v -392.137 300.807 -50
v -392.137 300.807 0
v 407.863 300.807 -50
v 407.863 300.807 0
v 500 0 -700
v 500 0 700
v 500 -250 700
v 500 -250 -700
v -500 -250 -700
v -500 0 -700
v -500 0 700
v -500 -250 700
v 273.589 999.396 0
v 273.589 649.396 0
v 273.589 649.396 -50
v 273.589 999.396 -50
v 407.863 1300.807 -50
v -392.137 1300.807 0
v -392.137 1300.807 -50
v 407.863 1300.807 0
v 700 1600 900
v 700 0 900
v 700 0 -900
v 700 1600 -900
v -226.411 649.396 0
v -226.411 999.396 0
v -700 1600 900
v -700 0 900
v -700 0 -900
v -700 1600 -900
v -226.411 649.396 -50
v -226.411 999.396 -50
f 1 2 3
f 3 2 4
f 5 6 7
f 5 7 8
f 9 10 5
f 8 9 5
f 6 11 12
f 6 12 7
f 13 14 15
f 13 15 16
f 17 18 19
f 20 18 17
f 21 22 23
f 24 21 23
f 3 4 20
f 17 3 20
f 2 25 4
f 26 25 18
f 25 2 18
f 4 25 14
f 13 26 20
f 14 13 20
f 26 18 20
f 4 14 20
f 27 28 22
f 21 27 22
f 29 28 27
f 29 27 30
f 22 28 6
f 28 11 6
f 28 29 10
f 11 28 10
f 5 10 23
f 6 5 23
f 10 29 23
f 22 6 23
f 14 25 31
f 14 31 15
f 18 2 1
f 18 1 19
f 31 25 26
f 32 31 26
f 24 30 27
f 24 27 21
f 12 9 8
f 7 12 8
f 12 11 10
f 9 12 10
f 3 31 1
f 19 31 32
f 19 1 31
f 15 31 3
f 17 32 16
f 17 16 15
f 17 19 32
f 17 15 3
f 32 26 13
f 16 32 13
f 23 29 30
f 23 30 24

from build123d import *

# Parameters (mm, degrees)
SKETCH1_W           = 1400
SKETCH1_H           = 1800
BOSS_EXTRUDE1_DEPTH = 1600
SKETCH2_W           = 1000
SKETCH2_H           = 1400
BOSS_EXTRUDE2_DEPTH = 250
SKETCH3_W           = 800
SKETCH3_H           = 1000
CUT_EXTRUDE1_DEPTH  = 50
SKETCH4_W           = 500
SKETCH4_H           = 350
BOSS_EXTRUDE3_DEPTH = 50


with BuildPart() as part:
    # Sketch1 → Boss-Extrude1 (new body)
    with BuildSketch(Plane(origin=(0, 0, 0), x_dir=(1, 0, 0), z_dir=(0, 1, 0))):
        Rectangle(SKETCH1_W, SKETCH1_H)
    extrude(amount=BOSS_EXTRUDE1_DEPTH)

    # Sketch2 → Boss-Extrude2 (add)
    with BuildSketch(Plane(origin=(0, 0, 0), x_dir=(1, 0, 0), z_dir=(0, 1, 0))):
        Rectangle(SKETCH2_W, SKETCH2_H)
    extrude(amount=-BOSS_EXTRUDE2_DEPTH)

    # Sketch3 → Cut-Extrude1 (cut)
    with BuildSketch(Plane.XY):
        with Locations((7.862922359, 800.806757739)):
            Rectangle(SKETCH3_W, SKETCH3_H)
    extrude(amount=-CUT_EXTRUDE1_DEPTH, mode=Mode.SUBTRACT)

    # Sketch4 → Boss-Extrude3 (add)
    with BuildSketch(Plane.XY):
        with Locations((23.588767076, 824.395524815)):
            Rectangle(SKETCH4_W, SKETCH4_H)
    extrude(amount=-BOSS_EXTRUDE3_DEPTH)


solid = part.part
